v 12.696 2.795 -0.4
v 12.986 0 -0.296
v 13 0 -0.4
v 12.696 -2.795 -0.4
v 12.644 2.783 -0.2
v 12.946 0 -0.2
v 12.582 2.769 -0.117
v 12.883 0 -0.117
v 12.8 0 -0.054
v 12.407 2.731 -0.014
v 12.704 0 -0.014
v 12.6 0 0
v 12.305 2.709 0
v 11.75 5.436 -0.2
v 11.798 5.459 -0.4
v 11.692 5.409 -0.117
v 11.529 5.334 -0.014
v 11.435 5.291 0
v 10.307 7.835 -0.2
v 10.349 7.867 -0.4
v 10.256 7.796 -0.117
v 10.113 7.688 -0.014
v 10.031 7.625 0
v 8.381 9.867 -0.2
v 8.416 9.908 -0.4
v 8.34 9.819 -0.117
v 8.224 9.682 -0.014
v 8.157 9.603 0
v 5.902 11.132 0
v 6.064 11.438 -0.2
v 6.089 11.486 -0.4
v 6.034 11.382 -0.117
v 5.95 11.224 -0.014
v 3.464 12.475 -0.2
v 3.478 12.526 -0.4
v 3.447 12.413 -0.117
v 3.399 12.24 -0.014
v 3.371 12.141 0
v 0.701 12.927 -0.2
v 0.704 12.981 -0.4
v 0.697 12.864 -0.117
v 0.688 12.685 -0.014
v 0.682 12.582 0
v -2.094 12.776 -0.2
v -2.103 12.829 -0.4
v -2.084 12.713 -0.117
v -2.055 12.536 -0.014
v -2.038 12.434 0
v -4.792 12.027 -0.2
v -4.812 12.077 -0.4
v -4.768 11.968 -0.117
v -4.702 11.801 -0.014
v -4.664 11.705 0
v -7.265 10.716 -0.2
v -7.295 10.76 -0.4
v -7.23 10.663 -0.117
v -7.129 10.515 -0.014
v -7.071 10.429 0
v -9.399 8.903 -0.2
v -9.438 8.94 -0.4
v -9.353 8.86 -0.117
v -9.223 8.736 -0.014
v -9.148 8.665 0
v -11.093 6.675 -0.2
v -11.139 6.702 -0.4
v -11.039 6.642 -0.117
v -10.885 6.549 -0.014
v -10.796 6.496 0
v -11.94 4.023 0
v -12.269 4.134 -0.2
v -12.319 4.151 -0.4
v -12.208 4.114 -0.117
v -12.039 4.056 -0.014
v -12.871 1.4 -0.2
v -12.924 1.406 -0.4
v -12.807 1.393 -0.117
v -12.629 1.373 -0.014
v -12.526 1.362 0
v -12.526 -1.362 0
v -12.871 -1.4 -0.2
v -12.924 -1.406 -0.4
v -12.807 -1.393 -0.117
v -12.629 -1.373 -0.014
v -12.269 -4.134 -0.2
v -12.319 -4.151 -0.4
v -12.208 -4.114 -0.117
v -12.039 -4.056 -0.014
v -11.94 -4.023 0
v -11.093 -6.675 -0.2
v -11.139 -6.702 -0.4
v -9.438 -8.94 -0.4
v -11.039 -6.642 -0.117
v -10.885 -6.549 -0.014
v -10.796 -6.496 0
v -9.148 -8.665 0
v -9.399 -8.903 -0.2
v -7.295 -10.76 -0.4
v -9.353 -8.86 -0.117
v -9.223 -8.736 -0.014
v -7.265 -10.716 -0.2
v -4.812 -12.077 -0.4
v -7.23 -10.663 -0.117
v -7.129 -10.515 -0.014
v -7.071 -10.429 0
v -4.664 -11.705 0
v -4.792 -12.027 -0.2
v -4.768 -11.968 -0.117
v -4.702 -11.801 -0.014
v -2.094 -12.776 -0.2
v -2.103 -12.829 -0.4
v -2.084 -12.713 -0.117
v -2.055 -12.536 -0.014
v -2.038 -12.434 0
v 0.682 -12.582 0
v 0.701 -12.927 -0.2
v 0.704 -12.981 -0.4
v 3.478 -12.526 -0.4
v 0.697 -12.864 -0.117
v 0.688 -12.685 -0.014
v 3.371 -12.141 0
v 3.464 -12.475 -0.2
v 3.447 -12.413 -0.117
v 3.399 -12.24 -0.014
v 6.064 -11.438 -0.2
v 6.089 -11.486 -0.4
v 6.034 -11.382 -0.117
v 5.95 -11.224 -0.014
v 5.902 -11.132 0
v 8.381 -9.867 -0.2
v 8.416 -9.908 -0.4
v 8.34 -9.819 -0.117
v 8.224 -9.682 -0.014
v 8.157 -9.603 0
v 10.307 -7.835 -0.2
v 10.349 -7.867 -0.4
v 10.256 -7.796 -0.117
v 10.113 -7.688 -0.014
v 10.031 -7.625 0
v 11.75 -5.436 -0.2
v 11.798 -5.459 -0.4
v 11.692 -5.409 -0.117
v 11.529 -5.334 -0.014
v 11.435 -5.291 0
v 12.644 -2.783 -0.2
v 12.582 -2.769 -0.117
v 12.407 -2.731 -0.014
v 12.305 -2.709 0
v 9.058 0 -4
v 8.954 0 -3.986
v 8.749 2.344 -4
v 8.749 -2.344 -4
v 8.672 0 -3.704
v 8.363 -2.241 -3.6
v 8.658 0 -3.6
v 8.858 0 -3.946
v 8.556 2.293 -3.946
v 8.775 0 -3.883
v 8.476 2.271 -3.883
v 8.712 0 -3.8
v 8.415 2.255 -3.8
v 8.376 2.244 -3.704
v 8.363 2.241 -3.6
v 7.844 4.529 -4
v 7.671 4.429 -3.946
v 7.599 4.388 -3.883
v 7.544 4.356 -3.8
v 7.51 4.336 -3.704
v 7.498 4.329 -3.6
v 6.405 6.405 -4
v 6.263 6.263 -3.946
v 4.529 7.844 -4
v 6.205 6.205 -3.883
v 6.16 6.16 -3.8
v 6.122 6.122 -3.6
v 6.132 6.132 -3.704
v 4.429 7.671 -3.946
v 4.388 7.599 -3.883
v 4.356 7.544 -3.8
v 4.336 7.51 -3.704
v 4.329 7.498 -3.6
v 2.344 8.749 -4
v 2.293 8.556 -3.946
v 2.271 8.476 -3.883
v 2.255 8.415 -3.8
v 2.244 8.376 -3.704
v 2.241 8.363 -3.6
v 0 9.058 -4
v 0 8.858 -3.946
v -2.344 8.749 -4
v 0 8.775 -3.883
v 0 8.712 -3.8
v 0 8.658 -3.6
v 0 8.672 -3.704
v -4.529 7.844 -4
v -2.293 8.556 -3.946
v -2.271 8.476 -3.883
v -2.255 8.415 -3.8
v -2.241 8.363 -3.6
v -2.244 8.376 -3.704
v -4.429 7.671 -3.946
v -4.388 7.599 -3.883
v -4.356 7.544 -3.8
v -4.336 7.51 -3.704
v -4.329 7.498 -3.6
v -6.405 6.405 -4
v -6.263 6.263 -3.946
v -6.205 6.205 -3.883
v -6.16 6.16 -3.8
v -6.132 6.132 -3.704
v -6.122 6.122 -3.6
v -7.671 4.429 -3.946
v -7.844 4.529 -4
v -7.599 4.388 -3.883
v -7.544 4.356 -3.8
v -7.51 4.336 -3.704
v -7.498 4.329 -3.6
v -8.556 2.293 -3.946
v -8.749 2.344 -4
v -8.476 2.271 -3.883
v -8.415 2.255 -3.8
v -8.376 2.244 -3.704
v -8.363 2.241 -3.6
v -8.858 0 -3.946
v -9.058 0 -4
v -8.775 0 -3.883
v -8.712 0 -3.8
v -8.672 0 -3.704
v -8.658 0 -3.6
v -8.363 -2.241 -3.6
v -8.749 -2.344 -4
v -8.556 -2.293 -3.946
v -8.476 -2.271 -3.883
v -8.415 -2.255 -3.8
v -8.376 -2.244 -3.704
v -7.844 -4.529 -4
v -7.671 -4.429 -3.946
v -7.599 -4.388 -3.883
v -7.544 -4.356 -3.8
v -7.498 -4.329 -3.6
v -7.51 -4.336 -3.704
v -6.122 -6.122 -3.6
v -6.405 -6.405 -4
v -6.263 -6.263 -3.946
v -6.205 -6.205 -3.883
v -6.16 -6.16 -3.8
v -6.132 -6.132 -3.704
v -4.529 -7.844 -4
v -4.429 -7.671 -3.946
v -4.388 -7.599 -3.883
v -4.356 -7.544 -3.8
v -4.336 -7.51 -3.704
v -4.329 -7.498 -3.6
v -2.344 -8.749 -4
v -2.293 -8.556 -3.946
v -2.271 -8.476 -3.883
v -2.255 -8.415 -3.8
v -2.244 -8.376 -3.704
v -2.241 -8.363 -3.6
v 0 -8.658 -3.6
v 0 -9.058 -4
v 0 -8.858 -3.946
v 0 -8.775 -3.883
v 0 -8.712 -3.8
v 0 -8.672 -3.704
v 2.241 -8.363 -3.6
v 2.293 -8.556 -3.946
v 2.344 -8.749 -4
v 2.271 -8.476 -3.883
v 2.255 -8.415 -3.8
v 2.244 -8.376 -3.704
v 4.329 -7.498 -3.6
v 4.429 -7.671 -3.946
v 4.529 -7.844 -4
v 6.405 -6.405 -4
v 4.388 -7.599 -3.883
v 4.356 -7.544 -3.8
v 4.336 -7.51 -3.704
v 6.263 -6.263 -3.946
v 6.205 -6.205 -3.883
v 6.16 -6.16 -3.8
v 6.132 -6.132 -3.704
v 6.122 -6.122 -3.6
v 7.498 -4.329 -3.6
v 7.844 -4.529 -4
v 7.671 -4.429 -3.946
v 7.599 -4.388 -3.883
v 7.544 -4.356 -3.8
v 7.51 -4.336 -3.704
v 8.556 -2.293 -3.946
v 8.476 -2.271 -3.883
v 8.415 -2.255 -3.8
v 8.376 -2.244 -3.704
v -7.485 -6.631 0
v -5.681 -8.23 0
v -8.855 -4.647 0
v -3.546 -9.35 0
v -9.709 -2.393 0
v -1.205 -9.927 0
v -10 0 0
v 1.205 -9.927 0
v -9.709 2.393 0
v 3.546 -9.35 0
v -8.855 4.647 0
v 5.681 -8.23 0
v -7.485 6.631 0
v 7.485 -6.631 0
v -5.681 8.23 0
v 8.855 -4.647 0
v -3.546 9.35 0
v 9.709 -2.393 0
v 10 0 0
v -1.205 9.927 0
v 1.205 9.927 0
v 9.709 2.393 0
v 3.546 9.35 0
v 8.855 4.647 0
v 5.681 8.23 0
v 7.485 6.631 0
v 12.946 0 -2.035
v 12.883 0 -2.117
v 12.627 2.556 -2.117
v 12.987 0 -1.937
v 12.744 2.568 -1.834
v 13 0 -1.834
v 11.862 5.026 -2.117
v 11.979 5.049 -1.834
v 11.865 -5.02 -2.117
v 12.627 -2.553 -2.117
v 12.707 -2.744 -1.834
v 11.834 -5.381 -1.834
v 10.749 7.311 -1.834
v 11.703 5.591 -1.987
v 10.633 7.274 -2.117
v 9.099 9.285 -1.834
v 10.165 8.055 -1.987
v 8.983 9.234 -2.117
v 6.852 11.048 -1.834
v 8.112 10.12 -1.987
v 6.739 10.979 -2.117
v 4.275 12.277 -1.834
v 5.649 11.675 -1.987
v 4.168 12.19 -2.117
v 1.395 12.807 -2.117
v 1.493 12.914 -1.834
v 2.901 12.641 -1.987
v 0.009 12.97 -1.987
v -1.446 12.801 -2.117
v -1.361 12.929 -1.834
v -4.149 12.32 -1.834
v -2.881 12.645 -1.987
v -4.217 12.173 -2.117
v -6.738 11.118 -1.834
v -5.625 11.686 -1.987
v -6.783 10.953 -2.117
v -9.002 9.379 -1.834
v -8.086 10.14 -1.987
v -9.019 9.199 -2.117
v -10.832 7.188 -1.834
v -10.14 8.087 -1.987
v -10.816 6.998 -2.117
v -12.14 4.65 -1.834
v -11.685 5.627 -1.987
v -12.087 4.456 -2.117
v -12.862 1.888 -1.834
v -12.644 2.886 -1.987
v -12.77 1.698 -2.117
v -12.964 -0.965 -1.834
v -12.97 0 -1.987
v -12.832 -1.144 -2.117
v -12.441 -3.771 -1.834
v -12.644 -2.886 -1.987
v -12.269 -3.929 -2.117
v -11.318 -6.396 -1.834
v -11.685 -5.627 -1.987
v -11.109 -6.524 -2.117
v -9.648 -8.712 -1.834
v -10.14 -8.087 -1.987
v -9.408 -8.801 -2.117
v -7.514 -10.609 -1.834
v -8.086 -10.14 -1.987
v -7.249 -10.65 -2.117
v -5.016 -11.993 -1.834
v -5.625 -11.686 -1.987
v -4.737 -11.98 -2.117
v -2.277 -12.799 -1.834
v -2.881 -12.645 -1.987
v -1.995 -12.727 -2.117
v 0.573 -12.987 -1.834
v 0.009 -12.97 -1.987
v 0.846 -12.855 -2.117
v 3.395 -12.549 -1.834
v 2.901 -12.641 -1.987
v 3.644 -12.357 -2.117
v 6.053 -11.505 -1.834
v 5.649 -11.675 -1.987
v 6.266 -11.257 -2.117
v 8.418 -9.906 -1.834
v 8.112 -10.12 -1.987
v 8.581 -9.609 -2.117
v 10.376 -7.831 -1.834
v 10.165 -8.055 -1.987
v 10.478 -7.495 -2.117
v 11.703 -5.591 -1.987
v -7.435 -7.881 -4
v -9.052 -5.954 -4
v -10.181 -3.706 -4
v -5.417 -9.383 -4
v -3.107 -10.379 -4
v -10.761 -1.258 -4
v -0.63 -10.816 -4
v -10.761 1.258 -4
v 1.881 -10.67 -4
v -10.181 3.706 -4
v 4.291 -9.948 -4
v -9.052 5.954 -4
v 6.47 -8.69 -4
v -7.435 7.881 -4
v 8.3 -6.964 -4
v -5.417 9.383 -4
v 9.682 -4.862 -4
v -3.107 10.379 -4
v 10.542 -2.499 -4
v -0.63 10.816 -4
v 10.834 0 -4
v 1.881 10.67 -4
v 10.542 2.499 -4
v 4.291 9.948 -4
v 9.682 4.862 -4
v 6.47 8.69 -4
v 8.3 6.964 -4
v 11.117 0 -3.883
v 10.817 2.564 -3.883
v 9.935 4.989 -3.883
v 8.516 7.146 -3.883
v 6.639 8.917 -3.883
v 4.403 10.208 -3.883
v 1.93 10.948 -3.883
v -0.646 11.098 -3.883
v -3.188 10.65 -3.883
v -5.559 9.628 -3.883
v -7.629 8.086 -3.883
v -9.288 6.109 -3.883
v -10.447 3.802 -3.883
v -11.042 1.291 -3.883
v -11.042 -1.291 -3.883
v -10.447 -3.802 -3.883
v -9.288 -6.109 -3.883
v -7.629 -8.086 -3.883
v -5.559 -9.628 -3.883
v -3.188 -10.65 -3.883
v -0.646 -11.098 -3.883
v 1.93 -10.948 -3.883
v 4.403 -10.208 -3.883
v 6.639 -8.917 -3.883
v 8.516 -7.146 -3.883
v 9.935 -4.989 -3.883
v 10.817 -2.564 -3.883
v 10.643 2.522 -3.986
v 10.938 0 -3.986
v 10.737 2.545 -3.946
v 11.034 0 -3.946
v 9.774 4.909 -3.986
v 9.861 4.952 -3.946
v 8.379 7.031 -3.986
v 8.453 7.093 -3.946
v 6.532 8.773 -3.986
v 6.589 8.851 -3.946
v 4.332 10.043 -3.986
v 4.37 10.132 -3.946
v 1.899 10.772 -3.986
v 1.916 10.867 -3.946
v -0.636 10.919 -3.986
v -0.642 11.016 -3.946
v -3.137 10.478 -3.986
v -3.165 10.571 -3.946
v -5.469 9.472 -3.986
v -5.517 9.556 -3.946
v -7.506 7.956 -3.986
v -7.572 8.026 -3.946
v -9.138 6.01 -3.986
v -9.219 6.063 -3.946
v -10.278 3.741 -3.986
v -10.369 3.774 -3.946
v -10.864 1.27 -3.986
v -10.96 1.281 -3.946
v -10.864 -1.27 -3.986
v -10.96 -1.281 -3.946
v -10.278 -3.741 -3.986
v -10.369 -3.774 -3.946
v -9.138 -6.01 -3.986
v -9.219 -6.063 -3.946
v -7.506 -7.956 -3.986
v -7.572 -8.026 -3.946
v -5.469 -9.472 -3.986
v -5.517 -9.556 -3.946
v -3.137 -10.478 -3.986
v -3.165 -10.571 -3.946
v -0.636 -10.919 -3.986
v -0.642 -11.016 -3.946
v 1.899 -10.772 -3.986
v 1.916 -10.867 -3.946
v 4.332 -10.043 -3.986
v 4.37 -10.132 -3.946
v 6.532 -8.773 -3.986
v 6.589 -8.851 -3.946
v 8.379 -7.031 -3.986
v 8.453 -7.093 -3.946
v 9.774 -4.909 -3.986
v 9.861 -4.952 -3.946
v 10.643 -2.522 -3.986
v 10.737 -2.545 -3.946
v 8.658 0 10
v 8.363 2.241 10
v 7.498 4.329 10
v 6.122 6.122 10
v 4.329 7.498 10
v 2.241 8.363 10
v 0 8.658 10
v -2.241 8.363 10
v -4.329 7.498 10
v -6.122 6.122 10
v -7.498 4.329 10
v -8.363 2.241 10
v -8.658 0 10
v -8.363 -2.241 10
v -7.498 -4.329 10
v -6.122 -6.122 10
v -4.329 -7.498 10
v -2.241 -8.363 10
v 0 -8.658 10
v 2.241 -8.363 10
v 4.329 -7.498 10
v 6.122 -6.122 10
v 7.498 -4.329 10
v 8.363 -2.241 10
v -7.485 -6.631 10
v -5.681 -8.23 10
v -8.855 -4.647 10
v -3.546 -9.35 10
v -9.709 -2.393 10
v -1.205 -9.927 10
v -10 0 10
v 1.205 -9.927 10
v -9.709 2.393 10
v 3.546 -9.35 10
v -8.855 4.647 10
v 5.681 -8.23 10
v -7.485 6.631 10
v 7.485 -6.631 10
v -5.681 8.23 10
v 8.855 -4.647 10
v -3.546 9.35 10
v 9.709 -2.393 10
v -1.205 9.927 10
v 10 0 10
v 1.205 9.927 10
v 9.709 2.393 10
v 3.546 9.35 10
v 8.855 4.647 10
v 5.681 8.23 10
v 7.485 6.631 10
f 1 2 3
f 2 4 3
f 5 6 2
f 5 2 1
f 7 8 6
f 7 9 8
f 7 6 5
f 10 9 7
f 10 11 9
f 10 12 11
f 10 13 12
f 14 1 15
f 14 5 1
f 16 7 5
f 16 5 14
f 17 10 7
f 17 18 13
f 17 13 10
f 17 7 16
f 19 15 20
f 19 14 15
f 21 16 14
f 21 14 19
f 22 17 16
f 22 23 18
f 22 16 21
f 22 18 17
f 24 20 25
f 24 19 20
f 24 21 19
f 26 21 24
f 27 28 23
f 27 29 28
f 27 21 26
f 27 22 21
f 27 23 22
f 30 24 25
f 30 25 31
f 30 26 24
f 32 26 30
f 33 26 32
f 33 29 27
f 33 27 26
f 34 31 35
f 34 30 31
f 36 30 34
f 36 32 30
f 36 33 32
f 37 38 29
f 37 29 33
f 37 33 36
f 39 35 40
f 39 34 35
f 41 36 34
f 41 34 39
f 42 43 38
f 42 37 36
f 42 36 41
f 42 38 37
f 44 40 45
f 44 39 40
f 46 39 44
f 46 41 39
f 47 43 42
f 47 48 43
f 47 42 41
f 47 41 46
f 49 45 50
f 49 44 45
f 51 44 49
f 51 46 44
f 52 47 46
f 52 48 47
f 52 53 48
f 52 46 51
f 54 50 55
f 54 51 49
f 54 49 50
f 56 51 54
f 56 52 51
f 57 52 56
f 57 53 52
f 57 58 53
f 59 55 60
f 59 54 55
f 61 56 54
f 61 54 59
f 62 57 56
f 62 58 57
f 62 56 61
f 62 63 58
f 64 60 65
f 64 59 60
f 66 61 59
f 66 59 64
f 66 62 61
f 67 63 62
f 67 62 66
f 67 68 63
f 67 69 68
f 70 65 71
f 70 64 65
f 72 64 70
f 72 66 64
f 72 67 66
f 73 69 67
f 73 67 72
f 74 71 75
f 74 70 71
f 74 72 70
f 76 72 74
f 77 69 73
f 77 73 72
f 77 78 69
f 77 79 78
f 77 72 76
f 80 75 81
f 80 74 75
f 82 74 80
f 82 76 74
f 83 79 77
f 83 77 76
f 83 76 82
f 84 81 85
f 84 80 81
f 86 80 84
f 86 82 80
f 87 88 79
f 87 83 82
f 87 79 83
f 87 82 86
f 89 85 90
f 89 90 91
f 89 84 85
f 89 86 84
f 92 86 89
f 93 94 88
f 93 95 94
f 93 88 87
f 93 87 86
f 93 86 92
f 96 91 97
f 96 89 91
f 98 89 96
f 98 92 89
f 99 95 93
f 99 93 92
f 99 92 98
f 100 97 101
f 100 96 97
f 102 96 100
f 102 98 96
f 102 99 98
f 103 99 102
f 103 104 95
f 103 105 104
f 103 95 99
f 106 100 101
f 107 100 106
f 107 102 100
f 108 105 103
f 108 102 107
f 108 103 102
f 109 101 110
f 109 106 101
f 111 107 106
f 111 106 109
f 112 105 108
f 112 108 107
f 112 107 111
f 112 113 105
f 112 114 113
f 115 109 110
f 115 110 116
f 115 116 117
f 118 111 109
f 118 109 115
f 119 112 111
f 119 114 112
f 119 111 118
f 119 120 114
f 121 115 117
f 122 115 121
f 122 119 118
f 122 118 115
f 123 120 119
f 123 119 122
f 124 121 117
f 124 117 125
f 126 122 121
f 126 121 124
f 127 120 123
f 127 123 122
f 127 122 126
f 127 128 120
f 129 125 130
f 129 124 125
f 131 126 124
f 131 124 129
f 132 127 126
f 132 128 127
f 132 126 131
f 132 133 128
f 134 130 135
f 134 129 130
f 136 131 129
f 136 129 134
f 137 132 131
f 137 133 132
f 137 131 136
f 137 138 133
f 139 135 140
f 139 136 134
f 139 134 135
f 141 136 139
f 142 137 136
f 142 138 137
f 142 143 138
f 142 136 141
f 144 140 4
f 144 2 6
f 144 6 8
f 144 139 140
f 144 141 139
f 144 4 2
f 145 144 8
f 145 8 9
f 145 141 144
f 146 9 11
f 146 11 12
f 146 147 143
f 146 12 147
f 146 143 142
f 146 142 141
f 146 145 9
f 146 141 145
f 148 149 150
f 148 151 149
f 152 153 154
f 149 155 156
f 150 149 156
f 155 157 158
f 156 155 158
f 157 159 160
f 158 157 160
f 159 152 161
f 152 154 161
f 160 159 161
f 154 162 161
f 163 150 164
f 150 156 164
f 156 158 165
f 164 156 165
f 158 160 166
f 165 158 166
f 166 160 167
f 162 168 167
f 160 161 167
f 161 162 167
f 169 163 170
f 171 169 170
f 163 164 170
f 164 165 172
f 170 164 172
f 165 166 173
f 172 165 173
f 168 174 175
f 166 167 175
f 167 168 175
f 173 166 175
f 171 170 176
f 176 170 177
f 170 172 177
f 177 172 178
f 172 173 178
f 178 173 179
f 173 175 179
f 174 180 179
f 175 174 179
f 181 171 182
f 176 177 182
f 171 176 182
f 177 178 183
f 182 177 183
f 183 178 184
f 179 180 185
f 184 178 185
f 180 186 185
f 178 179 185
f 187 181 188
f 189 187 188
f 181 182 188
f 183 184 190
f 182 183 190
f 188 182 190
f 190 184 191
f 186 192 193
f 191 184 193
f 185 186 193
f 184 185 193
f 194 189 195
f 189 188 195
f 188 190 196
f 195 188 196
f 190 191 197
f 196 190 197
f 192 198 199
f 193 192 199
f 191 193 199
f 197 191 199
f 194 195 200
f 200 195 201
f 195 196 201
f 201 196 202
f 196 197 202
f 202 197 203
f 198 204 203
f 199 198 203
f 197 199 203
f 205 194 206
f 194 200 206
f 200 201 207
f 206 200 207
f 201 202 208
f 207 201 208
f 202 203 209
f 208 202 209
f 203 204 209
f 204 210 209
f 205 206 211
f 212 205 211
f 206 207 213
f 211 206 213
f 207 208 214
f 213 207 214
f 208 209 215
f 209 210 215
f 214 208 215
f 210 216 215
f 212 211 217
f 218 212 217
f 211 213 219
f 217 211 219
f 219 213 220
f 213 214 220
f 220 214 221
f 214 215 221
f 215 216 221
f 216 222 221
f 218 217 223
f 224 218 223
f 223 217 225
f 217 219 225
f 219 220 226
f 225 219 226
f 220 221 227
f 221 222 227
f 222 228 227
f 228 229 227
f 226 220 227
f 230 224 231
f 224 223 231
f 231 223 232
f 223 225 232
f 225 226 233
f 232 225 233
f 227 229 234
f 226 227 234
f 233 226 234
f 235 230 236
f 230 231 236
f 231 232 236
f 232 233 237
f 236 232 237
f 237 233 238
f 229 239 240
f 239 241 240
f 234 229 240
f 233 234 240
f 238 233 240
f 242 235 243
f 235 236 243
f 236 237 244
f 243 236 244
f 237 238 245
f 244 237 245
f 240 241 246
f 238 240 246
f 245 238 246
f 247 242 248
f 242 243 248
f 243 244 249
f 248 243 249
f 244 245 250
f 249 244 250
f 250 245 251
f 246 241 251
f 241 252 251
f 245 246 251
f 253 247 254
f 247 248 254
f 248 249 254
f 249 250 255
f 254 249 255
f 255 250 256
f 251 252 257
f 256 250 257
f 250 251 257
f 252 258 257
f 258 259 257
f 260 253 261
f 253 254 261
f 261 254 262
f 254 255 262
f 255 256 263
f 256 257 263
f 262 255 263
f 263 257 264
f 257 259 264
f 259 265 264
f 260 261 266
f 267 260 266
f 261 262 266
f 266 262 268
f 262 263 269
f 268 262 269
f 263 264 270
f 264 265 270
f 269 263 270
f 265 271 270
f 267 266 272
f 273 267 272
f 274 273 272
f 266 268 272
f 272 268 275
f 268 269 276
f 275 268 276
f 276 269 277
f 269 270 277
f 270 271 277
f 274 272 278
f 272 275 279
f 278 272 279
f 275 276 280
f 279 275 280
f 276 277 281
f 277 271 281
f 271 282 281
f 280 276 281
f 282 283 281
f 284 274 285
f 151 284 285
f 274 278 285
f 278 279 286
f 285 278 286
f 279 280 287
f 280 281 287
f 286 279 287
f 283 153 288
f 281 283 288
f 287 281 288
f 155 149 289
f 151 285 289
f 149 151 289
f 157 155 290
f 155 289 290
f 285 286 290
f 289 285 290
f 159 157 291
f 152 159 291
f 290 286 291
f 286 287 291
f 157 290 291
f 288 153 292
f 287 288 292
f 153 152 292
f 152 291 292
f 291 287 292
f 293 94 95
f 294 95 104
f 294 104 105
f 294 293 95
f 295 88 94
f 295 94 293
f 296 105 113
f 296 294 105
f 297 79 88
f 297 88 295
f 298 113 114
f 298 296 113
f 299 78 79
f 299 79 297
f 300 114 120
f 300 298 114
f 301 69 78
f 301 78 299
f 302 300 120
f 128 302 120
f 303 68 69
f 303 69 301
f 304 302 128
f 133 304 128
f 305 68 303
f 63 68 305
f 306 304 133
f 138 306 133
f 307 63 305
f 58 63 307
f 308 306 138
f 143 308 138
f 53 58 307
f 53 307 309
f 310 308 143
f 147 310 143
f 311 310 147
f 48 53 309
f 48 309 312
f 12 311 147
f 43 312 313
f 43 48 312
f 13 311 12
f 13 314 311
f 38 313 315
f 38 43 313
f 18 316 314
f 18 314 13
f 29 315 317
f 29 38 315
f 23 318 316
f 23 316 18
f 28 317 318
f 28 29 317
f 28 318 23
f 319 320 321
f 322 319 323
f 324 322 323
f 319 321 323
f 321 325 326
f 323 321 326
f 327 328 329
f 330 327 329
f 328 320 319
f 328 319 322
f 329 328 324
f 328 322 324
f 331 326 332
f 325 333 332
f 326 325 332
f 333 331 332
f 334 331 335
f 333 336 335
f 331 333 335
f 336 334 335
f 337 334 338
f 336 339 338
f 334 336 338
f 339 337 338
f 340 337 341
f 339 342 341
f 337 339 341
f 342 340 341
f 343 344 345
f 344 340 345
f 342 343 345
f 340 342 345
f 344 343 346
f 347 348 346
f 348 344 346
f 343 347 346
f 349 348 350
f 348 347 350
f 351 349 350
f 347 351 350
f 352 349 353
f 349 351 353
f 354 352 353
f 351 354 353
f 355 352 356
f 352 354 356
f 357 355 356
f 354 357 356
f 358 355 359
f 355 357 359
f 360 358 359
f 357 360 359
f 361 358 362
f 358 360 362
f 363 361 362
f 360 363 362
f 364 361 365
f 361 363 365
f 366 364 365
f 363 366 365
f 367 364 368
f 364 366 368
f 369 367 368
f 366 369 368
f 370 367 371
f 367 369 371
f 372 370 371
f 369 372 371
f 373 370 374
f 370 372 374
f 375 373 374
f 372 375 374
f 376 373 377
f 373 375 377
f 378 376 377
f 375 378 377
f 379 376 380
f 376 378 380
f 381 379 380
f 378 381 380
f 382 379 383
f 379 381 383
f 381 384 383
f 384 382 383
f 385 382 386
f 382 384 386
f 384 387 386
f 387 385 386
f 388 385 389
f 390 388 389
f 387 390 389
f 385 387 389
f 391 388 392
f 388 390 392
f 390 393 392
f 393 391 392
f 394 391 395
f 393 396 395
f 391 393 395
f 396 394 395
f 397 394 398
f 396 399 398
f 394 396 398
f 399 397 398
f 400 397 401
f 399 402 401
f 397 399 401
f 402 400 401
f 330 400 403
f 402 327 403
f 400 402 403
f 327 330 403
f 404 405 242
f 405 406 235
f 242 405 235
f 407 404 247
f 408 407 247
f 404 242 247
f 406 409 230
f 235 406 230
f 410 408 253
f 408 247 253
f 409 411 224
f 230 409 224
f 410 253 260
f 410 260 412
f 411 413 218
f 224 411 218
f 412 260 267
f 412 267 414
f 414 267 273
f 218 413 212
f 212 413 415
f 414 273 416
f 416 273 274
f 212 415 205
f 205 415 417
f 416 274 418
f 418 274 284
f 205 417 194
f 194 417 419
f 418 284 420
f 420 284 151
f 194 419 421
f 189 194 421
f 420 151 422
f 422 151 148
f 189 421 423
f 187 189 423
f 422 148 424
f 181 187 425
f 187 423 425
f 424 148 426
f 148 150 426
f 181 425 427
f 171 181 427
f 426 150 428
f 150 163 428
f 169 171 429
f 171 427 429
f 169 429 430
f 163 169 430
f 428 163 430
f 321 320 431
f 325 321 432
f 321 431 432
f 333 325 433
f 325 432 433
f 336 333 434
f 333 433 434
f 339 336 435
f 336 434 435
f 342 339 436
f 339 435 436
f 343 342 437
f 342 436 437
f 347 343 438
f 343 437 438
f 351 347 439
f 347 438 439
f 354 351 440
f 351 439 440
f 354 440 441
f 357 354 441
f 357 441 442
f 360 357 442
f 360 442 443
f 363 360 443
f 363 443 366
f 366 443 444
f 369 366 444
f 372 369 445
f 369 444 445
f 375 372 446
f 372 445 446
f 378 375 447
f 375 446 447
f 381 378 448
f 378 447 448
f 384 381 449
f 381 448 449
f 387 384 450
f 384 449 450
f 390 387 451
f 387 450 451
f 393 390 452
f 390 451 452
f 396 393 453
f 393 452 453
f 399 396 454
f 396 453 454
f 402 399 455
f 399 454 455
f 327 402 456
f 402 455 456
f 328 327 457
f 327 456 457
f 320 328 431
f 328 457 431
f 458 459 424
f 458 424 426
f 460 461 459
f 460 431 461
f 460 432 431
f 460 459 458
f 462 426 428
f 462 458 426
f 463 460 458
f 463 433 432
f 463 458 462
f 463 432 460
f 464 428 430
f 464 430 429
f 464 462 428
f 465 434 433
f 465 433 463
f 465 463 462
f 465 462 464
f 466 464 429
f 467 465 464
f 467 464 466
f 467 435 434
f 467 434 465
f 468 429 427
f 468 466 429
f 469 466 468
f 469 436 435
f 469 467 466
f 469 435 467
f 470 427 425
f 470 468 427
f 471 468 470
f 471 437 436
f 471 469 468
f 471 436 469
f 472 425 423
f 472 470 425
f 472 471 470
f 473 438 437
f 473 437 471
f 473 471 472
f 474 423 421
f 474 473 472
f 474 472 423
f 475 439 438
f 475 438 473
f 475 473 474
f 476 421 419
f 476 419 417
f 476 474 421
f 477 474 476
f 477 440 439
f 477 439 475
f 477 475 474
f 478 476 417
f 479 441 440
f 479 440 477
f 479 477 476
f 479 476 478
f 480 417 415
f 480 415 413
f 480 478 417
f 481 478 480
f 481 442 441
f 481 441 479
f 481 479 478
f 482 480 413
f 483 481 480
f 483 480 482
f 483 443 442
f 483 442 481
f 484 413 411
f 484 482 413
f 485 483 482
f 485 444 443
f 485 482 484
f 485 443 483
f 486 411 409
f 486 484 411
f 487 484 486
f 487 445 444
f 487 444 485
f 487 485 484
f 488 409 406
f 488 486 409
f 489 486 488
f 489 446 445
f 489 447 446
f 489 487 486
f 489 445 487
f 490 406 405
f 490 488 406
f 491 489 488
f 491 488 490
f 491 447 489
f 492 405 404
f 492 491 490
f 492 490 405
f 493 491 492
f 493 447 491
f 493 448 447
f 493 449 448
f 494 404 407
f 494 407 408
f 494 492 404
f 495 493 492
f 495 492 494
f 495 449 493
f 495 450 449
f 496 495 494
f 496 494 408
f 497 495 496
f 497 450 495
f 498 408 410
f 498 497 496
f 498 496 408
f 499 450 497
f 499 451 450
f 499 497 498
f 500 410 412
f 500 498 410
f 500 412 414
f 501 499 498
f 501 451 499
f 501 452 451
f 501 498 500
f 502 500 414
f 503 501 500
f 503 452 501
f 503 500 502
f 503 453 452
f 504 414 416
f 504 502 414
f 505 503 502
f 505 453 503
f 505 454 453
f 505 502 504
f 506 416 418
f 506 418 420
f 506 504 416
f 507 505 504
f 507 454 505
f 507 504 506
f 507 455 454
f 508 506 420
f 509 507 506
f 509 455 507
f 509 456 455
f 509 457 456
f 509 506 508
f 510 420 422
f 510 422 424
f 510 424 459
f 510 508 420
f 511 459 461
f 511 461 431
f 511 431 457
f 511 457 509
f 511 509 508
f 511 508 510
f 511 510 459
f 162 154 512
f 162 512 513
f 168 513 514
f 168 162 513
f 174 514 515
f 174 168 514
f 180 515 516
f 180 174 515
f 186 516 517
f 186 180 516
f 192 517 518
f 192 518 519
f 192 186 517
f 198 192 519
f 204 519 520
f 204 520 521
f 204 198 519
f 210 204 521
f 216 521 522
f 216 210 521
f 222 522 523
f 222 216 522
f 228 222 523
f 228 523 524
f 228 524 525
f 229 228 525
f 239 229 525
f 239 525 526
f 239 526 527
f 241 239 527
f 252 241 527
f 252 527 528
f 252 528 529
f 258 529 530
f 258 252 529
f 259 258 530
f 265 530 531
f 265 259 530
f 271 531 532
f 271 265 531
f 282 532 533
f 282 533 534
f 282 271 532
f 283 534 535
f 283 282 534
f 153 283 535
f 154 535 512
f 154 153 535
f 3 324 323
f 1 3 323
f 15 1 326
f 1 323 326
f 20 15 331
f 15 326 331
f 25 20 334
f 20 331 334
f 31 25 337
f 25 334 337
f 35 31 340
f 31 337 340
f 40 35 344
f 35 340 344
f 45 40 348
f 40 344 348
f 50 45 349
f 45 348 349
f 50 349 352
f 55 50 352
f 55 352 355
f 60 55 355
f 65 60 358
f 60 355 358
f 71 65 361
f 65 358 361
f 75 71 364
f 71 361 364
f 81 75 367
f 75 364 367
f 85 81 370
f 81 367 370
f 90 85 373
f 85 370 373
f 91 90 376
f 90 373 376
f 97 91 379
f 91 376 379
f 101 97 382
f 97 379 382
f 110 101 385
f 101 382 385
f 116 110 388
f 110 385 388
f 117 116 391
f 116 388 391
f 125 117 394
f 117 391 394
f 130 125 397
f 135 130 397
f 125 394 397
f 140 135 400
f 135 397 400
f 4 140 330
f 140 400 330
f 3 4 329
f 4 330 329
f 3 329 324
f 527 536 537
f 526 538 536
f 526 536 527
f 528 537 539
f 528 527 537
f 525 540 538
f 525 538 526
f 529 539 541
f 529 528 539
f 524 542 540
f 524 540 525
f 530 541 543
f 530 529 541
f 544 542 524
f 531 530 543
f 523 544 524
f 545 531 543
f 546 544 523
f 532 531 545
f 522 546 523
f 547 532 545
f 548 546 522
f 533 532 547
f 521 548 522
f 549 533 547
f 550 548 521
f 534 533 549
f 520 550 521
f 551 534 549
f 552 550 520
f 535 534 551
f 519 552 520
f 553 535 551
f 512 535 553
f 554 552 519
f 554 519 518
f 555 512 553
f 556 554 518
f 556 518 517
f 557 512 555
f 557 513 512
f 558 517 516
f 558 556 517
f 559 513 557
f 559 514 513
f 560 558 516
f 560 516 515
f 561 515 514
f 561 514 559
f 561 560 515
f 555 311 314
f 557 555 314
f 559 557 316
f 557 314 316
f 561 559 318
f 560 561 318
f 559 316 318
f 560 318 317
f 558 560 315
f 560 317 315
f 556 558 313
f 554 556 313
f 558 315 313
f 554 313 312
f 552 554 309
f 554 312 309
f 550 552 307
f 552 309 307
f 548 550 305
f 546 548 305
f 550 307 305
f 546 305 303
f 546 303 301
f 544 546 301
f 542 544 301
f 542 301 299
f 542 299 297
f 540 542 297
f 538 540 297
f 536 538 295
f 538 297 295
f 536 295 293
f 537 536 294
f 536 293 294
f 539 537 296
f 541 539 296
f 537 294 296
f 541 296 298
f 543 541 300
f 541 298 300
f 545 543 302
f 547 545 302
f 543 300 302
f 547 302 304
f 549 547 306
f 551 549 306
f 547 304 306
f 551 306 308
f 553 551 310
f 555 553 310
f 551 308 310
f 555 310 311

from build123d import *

# Parameters (mm, degrees)
SKETCH1_R           = 10
SKETCH1_R_2         = 8.657914019
BOSS_EXTRUDE1_DEPTH = 10
BOSS_EXTRUDE2_START = -4
SKETCH1_3_R         = 13
SKETCH1_3_R_2       = 8.657914019
BOSS_EXTRUDE2_DEPTH = 4
CHAMFER1_SIZE       = 2
FILLET1_R           = 0.4
FILLET2_R           = 0.4
FILLET3_R           = 0.4


with BuildPart() as part:
    # Sketch1 → Boss-Extrude1 (new body)
    with BuildSketch(Plane.XY):
        Circle(SKETCH1_R)
        Circle(SKETCH1_R_2, mode=Mode.SUBTRACT)
    extrude(amount=BOSS_EXTRUDE1_DEPTH)

    # Sketch1<3> → Boss-Extrude2 (add)
    with BuildSketch(Plane.XY.offset(BOSS_EXTRUDE2_START)):
        Circle(SKETCH1_3_R)
        Circle(SKETCH1_3_R_2, mode=Mode.SUBTRACT)
    extrude(amount=BOSS_EXTRUDE2_DEPTH)

    # Chamfer1
    chamfer1_edges = [part.edges().sort_by_distance(p)[0] for p in [
        (-13, 0, -4),
    ]]
    chamfer(chamfer1_edges, length=CHAMFER1_SIZE)

    # Fillet1
    fillet1_edges = [part.edges().sort_by_distance(p)[0] for p in [
        (-8.657914019, 0, -4),
    ]]
    fillet(fillet1_edges, radius=FILLET1_R)

    # Fillet2
    fillet2_edges = [part.edges().sort_by_distance(p)[0] for p in [
        (-13, 0, -2),
        (-11, 0, -4),
    ]]
    fillet(fillet2_edges, radius=FILLET2_R)

    # Fillet3
    fillet3_edges = [part.edges().sort_by_distance(p)[0] for p in [
        (-13, 0, 0),
    ]]
    fillet(fillet3_edges, radius=FILLET3_R)


solid = part.part
